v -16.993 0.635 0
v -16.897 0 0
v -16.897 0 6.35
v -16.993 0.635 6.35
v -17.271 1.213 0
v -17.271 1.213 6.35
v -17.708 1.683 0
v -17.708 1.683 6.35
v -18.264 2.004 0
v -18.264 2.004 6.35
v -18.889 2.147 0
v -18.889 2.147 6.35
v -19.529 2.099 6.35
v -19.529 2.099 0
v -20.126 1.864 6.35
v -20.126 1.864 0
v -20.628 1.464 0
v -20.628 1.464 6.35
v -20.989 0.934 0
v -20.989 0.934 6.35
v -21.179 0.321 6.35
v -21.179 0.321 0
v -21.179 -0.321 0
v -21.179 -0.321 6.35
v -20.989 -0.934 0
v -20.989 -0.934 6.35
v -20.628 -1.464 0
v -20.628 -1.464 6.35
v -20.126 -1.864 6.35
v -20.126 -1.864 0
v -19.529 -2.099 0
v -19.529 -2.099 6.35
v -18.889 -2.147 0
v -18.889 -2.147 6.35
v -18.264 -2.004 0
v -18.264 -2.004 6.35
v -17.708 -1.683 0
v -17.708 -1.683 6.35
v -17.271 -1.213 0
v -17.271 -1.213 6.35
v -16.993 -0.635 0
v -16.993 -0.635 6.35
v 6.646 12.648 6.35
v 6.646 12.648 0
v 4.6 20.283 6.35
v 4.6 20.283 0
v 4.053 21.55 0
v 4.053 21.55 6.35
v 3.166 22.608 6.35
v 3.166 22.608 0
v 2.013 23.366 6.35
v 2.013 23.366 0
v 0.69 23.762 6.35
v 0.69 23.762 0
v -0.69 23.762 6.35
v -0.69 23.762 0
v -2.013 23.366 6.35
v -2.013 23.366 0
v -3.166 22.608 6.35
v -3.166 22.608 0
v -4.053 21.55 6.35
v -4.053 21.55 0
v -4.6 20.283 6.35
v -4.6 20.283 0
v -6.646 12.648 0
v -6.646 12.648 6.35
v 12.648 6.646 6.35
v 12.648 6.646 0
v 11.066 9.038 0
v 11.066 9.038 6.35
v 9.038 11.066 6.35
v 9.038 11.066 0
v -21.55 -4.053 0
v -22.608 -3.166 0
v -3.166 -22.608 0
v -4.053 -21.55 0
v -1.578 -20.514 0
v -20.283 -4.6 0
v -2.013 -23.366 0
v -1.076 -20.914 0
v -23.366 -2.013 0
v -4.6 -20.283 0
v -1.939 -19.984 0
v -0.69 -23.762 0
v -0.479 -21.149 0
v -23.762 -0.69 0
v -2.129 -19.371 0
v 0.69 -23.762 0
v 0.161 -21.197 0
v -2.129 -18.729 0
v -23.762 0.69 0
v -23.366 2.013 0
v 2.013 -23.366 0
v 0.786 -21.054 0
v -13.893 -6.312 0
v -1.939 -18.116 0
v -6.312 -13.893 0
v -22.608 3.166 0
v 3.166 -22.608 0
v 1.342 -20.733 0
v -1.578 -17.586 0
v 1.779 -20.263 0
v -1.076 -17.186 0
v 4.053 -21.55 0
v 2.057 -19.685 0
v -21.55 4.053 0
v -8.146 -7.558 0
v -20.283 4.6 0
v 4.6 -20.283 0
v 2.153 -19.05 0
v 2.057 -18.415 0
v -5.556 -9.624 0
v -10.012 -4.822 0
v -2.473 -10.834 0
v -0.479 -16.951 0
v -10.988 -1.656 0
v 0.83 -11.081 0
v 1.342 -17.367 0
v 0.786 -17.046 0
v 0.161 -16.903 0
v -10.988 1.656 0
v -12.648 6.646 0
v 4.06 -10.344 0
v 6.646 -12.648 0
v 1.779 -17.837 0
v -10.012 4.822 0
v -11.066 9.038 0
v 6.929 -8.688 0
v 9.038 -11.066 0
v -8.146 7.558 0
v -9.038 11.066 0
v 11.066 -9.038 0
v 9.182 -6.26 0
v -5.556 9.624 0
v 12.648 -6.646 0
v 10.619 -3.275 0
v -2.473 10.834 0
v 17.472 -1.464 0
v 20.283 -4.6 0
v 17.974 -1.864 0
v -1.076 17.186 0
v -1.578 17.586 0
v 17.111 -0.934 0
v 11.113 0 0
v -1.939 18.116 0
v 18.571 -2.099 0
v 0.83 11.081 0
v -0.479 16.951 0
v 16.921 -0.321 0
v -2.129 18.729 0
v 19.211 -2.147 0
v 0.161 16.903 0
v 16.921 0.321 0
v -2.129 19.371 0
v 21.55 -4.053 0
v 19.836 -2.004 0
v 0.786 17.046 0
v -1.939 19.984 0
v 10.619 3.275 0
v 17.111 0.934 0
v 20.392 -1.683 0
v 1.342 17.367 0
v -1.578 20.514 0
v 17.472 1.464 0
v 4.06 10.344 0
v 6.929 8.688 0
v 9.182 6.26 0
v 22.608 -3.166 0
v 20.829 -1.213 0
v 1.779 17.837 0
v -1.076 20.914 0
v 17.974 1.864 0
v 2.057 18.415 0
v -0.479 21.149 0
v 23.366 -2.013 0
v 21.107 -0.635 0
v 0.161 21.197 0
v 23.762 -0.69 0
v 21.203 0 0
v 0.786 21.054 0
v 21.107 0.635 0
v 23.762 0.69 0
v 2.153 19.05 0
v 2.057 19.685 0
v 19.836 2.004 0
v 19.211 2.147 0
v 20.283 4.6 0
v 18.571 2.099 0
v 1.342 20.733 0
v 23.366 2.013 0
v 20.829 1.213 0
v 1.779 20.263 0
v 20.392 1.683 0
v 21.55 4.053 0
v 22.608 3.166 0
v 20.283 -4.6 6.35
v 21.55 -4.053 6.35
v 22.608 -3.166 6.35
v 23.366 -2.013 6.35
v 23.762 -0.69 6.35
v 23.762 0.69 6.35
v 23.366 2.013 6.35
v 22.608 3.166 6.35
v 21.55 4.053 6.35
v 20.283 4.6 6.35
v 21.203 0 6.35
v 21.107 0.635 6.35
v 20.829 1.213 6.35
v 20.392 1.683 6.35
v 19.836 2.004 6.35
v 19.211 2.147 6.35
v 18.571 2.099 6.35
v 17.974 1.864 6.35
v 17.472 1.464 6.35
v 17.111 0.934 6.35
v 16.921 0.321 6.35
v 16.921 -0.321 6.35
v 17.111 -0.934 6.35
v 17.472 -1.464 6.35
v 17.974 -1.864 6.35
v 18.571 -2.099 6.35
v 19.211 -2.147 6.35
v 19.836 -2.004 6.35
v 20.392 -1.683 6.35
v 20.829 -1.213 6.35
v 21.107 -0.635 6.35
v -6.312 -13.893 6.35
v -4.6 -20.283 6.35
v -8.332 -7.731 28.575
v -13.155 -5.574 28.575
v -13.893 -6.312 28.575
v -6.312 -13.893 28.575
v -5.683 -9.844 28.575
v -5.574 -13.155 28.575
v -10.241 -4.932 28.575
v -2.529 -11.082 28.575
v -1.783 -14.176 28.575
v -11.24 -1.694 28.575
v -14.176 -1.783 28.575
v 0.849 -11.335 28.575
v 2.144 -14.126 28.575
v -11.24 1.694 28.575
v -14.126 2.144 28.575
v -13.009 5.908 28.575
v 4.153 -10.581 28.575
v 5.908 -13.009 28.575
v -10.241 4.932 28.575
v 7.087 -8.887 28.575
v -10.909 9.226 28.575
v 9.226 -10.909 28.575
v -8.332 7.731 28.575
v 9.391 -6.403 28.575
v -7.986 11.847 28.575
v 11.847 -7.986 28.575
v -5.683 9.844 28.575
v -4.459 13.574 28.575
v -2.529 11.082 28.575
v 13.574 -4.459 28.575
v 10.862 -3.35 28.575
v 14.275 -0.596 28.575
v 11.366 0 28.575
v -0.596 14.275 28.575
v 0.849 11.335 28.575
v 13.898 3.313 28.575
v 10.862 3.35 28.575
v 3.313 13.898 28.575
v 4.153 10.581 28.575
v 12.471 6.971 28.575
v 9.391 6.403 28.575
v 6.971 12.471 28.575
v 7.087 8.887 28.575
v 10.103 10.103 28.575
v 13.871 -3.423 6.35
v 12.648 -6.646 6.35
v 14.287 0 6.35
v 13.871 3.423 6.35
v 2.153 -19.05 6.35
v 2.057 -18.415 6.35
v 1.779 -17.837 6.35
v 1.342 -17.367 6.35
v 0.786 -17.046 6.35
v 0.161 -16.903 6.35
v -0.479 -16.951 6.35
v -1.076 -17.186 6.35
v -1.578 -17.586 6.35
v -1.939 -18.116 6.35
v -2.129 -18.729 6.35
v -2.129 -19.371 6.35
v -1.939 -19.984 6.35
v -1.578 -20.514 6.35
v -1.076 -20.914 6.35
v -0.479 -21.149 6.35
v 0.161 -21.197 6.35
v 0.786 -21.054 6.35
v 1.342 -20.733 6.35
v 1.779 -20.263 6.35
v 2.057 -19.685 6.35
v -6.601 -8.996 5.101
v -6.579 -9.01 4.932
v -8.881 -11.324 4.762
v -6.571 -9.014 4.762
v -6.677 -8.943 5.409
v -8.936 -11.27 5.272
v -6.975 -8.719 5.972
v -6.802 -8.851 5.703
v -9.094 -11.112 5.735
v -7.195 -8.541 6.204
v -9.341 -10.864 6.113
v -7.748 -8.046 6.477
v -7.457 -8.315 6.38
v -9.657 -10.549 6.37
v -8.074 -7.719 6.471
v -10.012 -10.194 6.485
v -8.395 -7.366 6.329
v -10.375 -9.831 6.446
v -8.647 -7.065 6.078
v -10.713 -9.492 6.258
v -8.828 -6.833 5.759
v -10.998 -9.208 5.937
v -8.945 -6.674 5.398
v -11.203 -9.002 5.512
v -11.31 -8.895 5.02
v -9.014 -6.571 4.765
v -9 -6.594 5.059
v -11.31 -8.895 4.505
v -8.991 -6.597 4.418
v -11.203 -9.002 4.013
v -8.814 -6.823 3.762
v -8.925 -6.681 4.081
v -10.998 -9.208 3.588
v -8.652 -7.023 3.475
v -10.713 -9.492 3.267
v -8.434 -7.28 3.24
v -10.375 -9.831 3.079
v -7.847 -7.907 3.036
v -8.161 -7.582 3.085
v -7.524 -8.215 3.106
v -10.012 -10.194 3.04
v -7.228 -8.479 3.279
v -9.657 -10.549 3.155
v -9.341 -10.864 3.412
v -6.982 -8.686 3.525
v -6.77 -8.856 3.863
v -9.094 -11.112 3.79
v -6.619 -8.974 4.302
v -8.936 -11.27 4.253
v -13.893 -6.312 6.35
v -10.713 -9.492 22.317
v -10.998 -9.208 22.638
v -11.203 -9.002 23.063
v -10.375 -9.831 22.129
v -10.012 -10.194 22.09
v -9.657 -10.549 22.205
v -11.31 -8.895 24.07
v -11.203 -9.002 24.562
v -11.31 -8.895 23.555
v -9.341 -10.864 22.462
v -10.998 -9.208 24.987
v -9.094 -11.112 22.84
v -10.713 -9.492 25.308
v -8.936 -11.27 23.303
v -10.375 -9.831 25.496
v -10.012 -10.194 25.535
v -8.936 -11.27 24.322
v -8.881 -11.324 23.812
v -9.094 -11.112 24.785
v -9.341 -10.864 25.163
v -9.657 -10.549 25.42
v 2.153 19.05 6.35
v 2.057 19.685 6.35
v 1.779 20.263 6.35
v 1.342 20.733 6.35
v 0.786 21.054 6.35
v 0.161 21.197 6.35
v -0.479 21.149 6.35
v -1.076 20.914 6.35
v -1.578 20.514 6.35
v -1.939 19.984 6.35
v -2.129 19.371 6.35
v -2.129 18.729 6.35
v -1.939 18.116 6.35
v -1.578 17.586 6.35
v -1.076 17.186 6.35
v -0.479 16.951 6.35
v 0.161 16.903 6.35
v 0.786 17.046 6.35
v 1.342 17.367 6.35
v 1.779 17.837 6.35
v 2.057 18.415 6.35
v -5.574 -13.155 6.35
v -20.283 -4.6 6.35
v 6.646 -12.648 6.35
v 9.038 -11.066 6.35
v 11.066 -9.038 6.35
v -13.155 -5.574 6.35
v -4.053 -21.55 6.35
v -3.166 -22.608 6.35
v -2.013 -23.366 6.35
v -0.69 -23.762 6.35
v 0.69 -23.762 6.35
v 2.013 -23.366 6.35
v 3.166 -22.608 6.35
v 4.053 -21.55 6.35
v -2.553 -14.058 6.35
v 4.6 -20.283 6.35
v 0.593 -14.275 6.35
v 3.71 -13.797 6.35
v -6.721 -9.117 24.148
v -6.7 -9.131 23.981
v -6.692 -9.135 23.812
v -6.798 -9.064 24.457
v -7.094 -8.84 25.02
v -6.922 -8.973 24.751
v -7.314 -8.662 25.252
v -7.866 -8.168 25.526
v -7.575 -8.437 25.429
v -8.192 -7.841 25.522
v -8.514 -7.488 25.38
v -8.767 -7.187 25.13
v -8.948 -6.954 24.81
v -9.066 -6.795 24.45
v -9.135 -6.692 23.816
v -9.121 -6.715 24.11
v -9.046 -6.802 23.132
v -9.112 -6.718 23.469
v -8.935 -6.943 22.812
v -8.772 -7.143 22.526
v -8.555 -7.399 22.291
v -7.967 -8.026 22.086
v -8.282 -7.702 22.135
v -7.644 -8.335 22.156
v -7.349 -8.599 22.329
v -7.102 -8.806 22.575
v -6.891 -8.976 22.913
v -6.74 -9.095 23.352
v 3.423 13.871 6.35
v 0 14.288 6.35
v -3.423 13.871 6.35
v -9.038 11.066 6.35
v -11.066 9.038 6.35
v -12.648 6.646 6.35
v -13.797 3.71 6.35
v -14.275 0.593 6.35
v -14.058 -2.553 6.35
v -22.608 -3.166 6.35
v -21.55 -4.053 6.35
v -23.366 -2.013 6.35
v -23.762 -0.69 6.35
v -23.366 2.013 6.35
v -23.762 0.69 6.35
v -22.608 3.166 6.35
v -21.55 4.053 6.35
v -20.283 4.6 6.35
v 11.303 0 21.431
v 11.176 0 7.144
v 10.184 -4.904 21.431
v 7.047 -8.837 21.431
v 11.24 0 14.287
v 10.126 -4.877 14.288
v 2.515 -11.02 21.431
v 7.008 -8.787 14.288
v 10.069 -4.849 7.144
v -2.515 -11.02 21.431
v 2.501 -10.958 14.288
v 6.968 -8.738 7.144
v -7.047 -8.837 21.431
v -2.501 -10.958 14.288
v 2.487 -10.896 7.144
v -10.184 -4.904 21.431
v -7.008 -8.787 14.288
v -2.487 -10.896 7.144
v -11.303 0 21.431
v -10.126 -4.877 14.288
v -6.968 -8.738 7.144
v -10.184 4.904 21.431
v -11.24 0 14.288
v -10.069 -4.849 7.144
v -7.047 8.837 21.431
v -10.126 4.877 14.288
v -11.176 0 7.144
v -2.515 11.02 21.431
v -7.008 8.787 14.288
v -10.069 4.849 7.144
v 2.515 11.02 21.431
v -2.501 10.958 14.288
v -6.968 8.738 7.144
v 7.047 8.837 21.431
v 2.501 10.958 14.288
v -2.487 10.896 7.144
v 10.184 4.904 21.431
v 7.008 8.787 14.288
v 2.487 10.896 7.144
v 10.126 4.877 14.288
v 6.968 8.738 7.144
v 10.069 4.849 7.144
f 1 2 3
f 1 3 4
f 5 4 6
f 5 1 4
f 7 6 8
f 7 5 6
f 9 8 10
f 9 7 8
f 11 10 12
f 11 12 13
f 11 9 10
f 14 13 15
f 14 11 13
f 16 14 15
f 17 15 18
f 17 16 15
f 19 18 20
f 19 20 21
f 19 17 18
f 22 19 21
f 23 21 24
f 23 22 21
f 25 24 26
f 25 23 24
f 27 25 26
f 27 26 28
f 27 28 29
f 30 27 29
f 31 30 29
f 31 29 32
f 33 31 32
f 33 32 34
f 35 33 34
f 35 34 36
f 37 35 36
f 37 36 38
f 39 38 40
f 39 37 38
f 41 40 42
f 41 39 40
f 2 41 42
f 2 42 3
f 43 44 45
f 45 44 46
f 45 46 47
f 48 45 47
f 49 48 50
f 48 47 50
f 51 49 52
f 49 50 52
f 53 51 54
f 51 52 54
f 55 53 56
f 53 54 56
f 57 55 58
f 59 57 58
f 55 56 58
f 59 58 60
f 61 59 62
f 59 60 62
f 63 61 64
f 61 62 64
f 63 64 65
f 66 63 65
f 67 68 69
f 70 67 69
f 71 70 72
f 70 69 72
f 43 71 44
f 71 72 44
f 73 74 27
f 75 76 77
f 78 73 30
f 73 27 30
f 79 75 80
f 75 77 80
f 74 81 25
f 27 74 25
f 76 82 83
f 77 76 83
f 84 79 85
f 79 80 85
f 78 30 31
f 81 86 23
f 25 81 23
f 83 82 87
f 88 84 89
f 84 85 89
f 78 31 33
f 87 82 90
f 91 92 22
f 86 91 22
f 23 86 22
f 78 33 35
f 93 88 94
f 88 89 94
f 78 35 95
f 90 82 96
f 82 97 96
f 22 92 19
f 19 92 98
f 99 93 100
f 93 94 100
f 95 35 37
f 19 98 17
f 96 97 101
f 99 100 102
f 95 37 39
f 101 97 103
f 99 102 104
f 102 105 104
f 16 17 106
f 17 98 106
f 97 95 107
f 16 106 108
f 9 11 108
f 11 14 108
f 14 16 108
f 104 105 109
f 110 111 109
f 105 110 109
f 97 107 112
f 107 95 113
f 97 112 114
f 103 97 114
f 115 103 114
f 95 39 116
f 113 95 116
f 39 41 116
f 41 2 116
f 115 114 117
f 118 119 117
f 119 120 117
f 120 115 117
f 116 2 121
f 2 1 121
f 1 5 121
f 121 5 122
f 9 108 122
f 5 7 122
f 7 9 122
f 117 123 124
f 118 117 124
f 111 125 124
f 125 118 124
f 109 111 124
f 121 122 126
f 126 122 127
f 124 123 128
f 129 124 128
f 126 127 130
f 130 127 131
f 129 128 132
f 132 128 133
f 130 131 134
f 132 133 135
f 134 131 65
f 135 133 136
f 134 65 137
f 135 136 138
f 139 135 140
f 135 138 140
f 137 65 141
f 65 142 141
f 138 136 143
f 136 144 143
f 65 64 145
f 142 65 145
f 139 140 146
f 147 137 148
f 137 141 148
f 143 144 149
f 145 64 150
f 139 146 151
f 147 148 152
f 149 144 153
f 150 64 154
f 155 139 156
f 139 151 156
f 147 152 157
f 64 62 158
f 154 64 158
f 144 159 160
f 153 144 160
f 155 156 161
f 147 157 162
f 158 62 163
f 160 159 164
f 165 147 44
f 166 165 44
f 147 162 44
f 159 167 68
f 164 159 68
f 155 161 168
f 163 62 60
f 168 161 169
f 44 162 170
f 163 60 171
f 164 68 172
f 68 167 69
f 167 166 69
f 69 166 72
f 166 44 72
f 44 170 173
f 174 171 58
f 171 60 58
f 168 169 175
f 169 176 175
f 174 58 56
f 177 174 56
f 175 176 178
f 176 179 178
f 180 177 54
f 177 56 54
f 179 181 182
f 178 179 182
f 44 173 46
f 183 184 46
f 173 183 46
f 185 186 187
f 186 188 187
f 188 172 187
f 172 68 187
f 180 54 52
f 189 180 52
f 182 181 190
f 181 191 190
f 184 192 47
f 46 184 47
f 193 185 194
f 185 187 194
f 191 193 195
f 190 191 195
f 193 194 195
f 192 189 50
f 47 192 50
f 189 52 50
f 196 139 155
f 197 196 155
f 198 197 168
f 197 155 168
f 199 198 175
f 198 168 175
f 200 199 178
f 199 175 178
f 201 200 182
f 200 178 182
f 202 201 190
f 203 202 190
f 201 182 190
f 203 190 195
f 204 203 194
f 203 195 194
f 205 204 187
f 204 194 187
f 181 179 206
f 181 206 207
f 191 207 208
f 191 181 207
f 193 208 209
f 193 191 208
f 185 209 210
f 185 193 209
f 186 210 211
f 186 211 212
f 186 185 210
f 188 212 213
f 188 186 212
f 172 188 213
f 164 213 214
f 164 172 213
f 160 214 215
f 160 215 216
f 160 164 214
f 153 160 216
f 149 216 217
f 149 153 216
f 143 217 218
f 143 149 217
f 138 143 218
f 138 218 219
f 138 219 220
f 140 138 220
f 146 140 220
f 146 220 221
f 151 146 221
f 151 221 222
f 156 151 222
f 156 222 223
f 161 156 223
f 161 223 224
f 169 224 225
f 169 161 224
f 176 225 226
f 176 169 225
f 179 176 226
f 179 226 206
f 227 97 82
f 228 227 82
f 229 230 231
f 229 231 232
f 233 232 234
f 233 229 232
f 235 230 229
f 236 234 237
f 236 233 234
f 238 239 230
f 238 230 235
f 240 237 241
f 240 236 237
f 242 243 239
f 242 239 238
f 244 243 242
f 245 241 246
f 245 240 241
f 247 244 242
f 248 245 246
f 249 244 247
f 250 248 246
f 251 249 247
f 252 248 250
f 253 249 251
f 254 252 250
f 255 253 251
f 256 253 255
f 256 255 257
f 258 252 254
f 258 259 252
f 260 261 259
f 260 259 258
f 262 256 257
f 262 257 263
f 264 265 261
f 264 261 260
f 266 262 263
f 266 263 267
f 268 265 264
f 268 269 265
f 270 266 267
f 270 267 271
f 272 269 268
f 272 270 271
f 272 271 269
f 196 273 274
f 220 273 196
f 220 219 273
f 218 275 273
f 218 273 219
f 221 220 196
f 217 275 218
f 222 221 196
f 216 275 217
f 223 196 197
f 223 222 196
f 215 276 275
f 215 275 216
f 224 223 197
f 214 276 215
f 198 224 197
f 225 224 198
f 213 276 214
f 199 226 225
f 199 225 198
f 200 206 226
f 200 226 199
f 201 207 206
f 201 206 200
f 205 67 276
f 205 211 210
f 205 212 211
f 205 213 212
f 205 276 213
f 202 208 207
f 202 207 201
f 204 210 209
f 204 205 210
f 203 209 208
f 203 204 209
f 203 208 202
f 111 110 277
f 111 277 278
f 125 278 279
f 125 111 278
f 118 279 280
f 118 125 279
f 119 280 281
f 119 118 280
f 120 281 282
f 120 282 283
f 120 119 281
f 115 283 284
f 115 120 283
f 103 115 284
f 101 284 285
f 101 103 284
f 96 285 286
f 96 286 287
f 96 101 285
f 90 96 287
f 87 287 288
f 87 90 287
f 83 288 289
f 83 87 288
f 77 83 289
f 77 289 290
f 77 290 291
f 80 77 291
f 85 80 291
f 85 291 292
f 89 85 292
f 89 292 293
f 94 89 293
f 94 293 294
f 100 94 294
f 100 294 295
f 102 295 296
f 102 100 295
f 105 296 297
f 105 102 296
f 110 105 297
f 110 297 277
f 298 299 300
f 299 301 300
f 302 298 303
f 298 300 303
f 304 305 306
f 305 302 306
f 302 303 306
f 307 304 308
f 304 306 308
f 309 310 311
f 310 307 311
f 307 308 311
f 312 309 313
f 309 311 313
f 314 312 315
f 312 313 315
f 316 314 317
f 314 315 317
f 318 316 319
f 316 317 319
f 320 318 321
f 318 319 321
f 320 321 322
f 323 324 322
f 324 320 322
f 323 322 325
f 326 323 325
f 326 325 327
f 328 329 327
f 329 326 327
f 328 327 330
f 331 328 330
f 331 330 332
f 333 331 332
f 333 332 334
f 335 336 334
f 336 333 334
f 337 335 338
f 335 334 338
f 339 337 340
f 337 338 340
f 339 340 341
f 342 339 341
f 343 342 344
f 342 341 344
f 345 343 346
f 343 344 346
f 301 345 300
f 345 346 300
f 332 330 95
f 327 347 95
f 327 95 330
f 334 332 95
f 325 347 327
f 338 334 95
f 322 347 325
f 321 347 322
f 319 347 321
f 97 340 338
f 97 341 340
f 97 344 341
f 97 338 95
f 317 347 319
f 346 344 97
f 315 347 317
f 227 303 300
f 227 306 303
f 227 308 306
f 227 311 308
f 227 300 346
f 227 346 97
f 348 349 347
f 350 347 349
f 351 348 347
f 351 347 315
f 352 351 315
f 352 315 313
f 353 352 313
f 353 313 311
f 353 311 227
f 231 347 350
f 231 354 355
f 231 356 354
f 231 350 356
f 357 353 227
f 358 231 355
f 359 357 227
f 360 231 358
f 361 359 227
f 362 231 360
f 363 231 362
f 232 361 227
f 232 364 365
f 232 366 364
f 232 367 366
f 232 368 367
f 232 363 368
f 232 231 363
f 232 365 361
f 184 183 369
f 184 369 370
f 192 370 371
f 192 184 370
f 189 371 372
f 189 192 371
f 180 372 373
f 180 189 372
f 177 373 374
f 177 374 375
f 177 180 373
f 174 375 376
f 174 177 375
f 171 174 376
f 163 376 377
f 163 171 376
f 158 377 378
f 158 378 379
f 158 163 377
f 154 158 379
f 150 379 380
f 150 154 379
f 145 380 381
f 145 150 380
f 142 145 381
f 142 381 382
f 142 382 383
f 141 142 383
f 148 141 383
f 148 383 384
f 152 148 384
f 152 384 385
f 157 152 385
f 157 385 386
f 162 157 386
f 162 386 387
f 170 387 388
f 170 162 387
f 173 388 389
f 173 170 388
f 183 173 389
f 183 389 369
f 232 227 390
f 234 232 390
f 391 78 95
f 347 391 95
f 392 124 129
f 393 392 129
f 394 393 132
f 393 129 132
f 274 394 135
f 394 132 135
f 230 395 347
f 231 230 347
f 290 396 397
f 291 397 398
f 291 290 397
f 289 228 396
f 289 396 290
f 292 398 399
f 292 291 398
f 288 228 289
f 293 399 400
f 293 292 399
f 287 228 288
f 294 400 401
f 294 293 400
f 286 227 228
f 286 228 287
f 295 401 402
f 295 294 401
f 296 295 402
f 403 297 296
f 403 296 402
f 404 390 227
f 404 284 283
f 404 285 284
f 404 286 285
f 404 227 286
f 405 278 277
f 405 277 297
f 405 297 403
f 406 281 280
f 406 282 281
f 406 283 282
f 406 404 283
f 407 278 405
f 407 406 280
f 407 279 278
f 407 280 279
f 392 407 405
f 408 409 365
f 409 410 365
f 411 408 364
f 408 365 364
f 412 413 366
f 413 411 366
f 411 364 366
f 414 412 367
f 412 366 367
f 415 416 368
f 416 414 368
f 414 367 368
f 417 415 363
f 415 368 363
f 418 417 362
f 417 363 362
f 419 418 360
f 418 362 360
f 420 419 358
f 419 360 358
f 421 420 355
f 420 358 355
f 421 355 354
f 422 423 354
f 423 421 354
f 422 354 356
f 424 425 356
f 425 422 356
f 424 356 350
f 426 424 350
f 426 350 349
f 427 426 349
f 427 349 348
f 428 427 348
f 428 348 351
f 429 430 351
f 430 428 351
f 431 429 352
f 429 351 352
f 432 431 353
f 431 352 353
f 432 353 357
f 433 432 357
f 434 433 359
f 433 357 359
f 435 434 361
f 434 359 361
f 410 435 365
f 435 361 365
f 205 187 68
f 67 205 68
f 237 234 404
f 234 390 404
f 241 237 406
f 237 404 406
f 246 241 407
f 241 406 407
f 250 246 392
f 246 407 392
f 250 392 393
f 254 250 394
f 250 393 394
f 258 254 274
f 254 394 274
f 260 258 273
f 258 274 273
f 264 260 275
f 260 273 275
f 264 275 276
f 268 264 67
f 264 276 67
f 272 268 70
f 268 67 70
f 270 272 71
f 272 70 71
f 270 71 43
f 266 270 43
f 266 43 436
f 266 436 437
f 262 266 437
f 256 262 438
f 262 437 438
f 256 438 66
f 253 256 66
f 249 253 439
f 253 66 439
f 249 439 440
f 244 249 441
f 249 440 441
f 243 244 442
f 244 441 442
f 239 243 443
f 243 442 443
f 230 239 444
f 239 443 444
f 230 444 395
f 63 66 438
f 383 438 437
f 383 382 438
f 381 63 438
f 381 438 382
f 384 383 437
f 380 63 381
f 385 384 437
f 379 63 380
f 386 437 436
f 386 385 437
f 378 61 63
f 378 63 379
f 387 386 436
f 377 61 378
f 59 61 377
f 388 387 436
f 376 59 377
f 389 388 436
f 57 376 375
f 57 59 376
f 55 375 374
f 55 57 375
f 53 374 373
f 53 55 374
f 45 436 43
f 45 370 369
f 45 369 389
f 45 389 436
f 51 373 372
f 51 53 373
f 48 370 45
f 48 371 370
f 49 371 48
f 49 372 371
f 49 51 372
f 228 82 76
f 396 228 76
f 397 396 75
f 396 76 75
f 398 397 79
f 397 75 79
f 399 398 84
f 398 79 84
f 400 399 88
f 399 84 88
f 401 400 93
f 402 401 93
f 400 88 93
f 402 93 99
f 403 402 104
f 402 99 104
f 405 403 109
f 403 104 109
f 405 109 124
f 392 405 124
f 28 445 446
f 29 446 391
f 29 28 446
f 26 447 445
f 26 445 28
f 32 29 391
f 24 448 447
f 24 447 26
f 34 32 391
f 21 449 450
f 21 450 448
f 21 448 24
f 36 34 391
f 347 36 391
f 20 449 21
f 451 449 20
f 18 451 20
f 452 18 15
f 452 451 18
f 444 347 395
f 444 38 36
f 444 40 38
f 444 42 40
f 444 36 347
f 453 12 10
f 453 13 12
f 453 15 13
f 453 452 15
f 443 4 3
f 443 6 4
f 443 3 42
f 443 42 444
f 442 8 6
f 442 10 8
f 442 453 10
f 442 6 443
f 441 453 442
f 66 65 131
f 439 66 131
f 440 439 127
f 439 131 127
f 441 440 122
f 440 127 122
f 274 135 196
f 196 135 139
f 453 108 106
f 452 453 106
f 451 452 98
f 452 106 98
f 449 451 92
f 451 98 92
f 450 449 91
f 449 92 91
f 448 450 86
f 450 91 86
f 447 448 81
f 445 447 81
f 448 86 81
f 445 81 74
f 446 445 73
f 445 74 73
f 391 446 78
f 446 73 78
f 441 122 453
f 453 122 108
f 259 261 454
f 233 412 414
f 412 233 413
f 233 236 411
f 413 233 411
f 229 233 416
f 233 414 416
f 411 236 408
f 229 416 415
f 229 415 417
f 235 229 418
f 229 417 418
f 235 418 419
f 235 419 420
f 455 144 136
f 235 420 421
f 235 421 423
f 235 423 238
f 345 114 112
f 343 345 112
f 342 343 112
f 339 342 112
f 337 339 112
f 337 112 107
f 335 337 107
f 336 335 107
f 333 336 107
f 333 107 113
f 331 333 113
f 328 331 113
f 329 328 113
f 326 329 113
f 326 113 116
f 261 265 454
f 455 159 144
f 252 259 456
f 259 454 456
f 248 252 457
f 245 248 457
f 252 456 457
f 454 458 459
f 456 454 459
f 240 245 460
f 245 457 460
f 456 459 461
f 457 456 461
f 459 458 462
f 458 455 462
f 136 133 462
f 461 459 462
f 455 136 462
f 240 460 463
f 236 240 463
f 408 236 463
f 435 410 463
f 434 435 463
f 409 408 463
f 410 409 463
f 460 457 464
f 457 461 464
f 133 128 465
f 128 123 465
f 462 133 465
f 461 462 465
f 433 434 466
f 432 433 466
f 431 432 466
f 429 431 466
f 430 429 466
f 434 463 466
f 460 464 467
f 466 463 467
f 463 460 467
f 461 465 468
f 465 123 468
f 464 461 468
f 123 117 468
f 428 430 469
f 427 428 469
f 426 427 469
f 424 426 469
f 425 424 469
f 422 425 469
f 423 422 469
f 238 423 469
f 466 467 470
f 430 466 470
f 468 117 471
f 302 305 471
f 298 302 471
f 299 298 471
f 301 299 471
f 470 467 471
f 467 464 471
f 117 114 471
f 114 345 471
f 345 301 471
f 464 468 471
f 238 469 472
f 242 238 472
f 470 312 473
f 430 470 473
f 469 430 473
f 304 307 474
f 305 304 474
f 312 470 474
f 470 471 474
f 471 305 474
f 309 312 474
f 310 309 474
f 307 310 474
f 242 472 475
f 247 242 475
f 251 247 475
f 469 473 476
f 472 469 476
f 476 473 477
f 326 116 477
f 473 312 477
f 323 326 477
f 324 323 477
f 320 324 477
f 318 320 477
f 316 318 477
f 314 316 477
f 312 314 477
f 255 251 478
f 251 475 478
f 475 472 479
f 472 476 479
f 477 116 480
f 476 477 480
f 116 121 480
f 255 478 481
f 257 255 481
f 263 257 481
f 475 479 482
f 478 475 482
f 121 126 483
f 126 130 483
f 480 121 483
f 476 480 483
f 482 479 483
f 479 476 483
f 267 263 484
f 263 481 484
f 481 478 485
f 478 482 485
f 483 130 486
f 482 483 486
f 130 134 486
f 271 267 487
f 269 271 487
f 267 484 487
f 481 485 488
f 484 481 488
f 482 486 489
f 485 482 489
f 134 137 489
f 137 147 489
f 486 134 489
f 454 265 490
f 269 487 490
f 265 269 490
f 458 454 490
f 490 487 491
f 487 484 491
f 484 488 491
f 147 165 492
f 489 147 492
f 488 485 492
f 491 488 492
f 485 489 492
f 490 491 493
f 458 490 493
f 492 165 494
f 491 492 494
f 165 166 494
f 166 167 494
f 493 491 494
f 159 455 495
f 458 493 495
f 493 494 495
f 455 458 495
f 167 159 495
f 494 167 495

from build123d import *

# Parameters (mm, degrees)
F0_R     = 2.15265
F0_R_2   = 11.1125
F1_DEPTH = 6.35
F2_R     = 14.2875
F2_R_2   = 11.1125
F3_DEPTH = 22.225
F5_DEPTH = 28.575
F6_R     = 1.7272
F7_DEPTH = 4.3100488316


# Not quite as in the source:
# - a fillet or chamfer that OpenCascade refuses, or shapes differently, is made with other operations: its cross-section is extruded or revolved along the edge and cut away or added


with BuildPart() as f1:
    # F0 (on Top) → F1 (new body)
    with BuildSketch(Plane.XY):
        with BuildLine():
            Line((6.6460049492, 12.6476588531), (4.6002217477, 20.2826257023))
            ThreePointArc((4.6002217477, 20.2826257023), (0, 23.8125), (-4.6002217477, 20.2826257023))
            Line((-4.6002217477, 20.2826257023), (-6.6460049492, 12.6476588531))
            ThreePointArc((-6.6460049492, 12.6476588531), (-10.1027881362, 10.1027881362), (-12.6476588531, 6.6460049492))
            Line((-12.6476588531, 6.6460049492), (-20.2826257023, 4.6002217477))
            ThreePointArc((-20.2826257023, 4.6002217477), (-23.8125, 0), (-20.2826257023, -4.6002217477))
            Line((-20.2826257023, -4.6002217477), (-12.6476588531, -6.6460049492))
            ThreePointArc((-12.6476588531, -6.6460049492), (-10.1027881362, -10.1027881362), (-6.6460049492, -12.6476588531))
            Line((-6.6460049492, -12.6476588531), (-4.6002217477, -20.2826257023))
            ThreePointArc((-4.6002217477, -20.2826257023), (0, -23.8125), (4.6002217477, -20.2826257023))
            Line((4.6002217477, -20.2826257023), (6.6460049492, -12.6476588531))
            ThreePointArc((6.6460049492, -12.6476588531), (10.1027881362, -10.1027881362), (12.6476588531, -6.6460049492))
            Line((12.6476588531, -6.6460049492), (20.2826257023, -4.6002217477))
            ThreePointArc((20.2826257023, -4.6002217477), (23.8125, 0), (20.2826257023, 4.6002217477))
            Line((20.2826257023, 4.6002217477), (12.6476588531, 6.6460049492))
            ThreePointArc((12.6476588531, 6.6460049492), (10.1027881362, 10.1027881362), (6.6460049492, 12.6476588531))
        make_face()
        with Locations((0, -19.05)):
            Circle(F0_R, mode=Mode.SUBTRACT)
        with Locations((-19.05, 0)):
            Circle(F0_R, mode=Mode.SUBTRACT)
        Circle(F0_R_2, mode=Mode.SUBTRACT)
        with Locations((19.05, 0)):
            Circle(F0_R, mode=Mode.SUBTRACT)
        with Locations((0, 19.05)):
            Circle(F0_R, mode=Mode.SUBTRACT)
    extrude(amount=F1_DEPTH)

    # F2 (on face) → F3 (join)
    with BuildSketch(Plane.XY.offset(6.35)):
        Circle(F2_R)
        Circle(F2_R_2, mode=Mode.SUBTRACT)
    extrude(amount=F3_DEPTH)

    # F4 (on face) → F5 (join, through all)
    with BuildSketch(Plane.XY.offset(28.575)):
        Polygon((-4.0671577888, -11.648290423), (-11.648290423, -4.0671577888), (-13.8933544533, -6.3122218191), (-6.3122218191, -13.8933544533), align=None)
    extrude(amount=-F5_DEPTH)

    # F6 (on face) → F7 (cut, up to face)
    with BuildSketch(Plane(origin=(-10.1027881362, -10.1027881362, 0), x_dir=(0.7071067812, -0.7071067812, 0), z_dir=(-0.7071067812, -0.7071067812, 0))):
        with Locations((0, 23.8125)):
            Circle(F6_R)
        with Locations((0, 4.7625)):
            Circle(F6_R)
    extrude(amount=-F7_DEPTH, mode=Mode.SUBTRACT)

    # F8: chamfer of 28.575 x 0.254 on 1 edges, made by hand

    # F8_s1 → F8_t2 (revolve, cut)
    with BuildSketch(Plane.XZ):
        Polygon((11.3665, 28.575), (11.1125, 0), (11.1125, 28.575), align=None)
    revolve(axis=Axis((0, 0, 28.575), (0, 0, -1)), mode=Mode.SUBTRACT)


solid = f1.part
